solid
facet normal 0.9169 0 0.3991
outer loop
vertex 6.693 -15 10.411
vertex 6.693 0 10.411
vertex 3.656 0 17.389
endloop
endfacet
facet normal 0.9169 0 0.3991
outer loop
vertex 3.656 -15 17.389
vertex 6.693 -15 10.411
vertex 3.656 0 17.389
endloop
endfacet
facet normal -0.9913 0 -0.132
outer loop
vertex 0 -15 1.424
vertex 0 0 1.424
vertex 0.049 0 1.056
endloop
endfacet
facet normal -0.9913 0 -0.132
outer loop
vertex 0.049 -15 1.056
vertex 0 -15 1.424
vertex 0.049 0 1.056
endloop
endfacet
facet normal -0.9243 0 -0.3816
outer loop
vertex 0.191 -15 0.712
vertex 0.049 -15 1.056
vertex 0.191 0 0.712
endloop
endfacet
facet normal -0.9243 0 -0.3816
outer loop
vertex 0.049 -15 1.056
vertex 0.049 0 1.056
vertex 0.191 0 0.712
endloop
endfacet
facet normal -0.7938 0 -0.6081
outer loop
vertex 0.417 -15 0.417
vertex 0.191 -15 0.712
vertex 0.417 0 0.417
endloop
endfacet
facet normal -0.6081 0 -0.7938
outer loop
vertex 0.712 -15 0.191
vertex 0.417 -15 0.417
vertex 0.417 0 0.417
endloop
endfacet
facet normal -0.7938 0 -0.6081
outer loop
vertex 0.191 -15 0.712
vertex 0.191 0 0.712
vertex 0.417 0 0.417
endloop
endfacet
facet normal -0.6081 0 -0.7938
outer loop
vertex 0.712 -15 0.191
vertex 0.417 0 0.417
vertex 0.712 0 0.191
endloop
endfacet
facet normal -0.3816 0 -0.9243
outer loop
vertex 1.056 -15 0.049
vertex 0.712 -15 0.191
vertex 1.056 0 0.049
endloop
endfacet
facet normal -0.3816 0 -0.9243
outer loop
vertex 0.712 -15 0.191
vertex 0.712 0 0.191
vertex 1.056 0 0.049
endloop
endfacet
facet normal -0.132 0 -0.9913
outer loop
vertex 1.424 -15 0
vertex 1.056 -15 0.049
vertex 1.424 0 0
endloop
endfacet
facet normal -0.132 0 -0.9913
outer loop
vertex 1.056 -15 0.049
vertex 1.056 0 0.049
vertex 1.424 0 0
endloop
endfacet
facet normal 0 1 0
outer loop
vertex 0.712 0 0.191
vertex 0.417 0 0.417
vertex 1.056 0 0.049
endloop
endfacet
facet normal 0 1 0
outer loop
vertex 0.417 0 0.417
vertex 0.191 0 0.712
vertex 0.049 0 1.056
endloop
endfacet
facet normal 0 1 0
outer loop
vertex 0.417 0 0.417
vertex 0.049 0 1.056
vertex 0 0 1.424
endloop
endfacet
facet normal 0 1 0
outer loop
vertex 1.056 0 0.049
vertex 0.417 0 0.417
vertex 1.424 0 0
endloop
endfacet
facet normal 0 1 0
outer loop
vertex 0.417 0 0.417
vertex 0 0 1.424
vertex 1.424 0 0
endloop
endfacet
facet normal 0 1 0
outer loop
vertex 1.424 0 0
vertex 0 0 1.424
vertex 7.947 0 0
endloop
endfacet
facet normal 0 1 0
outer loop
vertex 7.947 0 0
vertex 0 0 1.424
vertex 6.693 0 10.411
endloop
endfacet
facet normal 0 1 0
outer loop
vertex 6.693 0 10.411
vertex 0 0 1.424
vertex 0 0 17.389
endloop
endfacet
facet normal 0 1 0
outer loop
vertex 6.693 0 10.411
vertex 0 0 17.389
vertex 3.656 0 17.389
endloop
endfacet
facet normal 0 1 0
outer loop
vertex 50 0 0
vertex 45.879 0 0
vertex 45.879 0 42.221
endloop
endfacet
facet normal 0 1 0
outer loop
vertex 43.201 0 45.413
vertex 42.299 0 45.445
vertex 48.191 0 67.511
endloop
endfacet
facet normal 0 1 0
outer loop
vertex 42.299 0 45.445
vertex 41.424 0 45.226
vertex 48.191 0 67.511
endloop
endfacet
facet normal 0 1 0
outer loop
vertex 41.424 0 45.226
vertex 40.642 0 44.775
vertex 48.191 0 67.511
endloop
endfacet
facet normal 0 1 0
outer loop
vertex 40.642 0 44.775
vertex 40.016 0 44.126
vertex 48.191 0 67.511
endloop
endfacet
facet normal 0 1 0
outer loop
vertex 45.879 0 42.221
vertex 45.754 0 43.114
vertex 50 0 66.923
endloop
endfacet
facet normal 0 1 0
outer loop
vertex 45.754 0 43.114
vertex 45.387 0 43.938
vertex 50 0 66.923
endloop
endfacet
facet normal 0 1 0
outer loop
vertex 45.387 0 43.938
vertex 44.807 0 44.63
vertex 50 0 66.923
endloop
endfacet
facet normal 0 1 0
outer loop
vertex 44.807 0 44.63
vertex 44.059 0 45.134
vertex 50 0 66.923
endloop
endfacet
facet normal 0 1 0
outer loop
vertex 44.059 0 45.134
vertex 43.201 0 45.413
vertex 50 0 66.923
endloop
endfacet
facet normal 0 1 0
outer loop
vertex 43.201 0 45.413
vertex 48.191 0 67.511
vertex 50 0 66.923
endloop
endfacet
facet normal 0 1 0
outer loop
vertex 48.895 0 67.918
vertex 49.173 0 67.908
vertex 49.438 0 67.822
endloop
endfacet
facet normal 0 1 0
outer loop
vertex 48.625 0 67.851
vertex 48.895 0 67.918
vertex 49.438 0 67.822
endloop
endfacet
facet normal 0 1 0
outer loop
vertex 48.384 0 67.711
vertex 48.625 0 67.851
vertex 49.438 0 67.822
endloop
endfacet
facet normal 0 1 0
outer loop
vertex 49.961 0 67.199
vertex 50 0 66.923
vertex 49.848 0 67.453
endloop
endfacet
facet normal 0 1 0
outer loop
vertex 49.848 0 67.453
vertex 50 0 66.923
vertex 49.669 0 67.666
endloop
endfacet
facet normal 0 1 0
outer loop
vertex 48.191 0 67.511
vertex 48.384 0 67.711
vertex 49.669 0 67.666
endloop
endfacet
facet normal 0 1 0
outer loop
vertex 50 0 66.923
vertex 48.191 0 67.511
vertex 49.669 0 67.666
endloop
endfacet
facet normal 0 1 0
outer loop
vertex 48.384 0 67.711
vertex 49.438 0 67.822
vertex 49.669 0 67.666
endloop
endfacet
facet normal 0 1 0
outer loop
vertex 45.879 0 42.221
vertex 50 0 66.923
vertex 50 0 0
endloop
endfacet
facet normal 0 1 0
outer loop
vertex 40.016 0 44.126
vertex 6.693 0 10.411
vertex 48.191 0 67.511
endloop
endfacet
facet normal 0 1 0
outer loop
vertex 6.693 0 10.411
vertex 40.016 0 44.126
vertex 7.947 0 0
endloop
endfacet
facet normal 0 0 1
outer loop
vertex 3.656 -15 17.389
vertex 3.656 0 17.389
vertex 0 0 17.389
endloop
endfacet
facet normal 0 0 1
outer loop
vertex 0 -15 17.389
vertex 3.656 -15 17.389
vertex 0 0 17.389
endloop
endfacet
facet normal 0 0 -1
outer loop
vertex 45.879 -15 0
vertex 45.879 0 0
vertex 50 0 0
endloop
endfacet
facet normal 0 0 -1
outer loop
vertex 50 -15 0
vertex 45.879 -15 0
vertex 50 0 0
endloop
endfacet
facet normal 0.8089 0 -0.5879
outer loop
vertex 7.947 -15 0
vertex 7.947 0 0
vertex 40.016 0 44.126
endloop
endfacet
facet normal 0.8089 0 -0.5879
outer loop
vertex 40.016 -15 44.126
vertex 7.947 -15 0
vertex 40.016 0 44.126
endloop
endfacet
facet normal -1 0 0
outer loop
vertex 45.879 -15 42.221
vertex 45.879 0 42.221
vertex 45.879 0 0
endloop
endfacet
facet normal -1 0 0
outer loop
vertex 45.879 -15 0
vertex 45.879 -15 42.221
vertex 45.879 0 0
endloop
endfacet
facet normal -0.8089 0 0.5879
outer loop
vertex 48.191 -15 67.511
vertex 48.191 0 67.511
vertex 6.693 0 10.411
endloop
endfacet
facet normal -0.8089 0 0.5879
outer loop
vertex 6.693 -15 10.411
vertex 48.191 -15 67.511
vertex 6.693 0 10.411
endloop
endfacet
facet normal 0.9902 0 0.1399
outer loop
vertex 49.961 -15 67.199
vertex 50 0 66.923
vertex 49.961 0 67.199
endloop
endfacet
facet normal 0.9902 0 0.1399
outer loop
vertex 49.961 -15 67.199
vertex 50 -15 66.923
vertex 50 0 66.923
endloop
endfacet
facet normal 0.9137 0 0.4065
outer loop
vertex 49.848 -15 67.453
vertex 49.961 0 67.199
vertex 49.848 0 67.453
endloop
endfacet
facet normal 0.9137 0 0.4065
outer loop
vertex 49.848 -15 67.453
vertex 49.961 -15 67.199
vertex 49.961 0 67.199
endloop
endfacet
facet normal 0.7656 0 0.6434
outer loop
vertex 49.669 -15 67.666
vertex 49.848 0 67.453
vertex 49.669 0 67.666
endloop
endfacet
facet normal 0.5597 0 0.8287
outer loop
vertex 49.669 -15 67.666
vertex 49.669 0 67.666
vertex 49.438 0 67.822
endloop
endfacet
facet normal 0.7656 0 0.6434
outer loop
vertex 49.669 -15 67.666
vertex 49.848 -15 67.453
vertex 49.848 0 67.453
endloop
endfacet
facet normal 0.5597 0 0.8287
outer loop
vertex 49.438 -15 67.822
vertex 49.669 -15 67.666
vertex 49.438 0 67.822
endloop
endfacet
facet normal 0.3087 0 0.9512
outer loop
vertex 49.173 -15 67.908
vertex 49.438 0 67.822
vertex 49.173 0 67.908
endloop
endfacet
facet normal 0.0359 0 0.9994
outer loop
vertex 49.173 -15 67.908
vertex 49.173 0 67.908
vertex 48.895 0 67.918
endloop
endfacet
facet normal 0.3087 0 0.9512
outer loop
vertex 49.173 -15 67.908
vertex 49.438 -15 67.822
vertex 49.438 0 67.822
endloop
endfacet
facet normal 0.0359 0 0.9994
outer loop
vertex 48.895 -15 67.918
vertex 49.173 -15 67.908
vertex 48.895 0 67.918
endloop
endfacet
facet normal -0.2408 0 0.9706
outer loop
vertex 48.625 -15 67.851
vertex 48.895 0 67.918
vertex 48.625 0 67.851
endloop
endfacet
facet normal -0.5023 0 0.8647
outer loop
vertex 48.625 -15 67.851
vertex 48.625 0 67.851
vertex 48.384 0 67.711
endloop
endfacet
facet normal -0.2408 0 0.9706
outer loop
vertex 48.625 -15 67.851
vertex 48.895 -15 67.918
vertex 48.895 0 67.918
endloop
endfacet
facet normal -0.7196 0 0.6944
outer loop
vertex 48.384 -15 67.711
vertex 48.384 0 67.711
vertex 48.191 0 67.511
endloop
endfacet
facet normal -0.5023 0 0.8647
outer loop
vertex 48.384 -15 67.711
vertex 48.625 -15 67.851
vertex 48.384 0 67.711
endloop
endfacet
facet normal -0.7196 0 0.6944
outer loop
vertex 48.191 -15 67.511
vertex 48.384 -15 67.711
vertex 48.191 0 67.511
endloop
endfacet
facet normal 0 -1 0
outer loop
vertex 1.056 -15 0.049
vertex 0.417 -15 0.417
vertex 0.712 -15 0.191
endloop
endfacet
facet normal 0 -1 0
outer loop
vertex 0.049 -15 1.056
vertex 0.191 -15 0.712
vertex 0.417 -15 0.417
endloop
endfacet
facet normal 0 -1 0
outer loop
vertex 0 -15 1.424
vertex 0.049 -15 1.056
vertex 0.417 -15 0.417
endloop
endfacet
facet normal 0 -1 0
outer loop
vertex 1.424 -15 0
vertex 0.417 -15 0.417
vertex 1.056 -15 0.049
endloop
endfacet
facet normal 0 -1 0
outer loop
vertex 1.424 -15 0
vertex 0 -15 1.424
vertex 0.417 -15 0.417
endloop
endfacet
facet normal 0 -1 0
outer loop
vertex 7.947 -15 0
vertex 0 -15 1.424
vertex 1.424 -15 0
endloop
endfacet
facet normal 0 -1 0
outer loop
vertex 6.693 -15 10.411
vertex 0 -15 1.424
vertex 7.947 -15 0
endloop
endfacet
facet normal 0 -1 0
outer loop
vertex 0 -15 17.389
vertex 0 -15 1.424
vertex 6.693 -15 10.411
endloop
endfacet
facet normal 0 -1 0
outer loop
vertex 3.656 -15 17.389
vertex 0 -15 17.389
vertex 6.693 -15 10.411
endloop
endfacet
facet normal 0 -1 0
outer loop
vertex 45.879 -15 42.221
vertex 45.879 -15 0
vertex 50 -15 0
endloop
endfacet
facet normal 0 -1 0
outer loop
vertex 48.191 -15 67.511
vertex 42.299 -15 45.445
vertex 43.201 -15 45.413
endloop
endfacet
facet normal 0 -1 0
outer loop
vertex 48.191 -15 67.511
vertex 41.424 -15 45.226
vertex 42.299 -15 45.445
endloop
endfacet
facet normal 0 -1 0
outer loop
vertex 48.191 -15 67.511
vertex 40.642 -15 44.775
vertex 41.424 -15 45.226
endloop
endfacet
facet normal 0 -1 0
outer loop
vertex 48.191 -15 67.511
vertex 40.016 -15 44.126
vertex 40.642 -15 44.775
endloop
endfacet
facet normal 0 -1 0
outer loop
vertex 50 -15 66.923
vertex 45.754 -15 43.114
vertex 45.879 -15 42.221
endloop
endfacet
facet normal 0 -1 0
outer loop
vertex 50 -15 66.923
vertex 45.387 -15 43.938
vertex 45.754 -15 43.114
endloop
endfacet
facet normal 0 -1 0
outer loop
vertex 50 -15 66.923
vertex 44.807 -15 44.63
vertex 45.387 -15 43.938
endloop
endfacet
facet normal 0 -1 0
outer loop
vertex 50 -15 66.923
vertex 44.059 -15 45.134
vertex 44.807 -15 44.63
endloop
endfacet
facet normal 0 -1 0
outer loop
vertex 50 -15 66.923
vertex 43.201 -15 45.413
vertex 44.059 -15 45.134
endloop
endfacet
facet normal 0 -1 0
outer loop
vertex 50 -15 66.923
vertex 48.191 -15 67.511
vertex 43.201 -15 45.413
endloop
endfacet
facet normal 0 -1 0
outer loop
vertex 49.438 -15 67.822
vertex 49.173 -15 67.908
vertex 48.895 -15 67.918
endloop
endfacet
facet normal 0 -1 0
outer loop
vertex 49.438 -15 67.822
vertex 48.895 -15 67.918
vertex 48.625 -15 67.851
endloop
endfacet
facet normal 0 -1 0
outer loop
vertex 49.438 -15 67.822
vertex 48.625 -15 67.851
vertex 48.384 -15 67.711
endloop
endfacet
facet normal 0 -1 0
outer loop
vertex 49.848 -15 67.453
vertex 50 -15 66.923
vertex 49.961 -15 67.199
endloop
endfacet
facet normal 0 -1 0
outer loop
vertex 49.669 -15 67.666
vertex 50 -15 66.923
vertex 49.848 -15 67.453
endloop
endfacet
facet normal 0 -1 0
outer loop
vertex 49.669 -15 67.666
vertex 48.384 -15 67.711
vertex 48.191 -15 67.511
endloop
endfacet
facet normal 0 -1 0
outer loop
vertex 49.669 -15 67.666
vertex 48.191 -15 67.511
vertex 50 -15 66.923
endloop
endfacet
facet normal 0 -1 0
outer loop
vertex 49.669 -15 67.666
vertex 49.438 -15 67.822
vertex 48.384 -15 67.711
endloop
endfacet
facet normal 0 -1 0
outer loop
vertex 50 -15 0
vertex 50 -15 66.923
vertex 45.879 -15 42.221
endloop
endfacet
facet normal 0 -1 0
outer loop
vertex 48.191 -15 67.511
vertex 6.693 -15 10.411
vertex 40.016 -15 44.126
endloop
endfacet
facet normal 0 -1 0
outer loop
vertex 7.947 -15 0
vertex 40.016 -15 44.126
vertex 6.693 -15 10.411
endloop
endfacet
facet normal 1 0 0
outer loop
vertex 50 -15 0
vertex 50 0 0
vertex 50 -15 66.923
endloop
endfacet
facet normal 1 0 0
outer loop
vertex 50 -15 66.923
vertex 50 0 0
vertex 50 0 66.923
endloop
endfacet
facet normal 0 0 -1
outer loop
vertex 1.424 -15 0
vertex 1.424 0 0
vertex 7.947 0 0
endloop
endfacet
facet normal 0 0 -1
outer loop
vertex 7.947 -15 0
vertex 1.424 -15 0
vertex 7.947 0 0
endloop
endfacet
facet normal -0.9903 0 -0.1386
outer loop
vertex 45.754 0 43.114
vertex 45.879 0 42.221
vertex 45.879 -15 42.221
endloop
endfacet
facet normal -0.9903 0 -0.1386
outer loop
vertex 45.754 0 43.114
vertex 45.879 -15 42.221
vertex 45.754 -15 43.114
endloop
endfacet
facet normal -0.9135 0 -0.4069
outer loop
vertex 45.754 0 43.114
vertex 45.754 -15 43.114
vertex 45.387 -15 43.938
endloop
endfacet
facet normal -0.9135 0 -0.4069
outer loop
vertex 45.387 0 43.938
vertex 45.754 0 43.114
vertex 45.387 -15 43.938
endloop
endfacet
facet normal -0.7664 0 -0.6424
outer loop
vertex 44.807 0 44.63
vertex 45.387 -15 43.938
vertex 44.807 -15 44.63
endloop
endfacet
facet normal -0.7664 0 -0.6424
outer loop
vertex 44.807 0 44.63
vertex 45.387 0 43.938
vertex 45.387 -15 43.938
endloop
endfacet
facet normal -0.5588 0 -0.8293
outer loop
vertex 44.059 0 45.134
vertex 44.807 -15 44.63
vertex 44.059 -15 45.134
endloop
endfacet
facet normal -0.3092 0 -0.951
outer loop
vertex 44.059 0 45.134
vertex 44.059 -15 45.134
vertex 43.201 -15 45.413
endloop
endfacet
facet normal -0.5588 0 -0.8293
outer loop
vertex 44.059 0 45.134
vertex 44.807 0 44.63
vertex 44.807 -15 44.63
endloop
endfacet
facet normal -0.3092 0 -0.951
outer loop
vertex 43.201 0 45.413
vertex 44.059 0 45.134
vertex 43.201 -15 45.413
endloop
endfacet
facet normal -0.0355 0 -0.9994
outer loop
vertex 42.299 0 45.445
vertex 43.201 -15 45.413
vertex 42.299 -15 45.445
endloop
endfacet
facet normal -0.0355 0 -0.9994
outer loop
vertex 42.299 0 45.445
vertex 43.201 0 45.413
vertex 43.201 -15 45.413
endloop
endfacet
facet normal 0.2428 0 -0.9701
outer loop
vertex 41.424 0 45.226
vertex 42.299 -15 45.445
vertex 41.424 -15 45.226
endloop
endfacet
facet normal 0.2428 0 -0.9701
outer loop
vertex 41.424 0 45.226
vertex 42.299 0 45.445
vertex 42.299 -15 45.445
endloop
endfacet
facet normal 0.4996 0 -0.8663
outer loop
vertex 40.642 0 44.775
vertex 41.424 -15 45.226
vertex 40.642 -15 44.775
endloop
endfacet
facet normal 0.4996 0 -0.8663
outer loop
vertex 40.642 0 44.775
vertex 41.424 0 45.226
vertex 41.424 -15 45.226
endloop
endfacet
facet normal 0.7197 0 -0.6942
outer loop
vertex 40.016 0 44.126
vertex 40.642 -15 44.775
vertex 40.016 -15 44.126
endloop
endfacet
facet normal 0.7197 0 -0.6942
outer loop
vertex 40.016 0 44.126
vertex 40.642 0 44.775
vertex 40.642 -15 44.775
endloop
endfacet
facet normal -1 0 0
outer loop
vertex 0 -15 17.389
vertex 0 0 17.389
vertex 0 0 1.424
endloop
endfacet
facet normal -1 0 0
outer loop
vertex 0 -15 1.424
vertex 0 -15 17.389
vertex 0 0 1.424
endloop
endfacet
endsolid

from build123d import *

# Parameters (mm, degrees)
PAD_DEPTH = 15
FILLET_R  = 1


with BuildPart() as part:
    # Sketch (on XZ_Plane of Origin) → Pad (new body)
    with BuildSketch(Plane.XZ):
        with BuildLine():
            Line((50, 0), (49.999618, 70.000262))
            Line((49.999618, 70.000262), (6.693182, 10.410738))
            Line((6.693182, 10.410738), (3.65564, 17.3888))
            Line((3.65564, 17.3888), (0, 17.3888))
            Line((0, 17.3888), (0, 1.424316))
            ThreePointArc((0, 1.424316), (0.417173, 0.417173), (1.424316, 0))
            Line((1.424316, 0), (7.946815, 0))
            Line((7.946815, 0), (40.015537, 44.126464))
            ThreePointArc((45.879073, 42.220854), (43.63951, 45.303564), (40.015537, 44.126464))
            Line((45.879073, 42.220854), (45.879073, 0))
            Line((45.879073, 0), (50, 0))
        make_face()
    extrude(amount=PAD_DEPTH)

    # Fillet
    fillet_edges = [part.edges().sort_by_distance(p)[0] for p in [
        (49.999618, -7.5, 70.000262),
    ]]
    fillet(fillet_edges, radius=FILLET_R)


solid = part.part
